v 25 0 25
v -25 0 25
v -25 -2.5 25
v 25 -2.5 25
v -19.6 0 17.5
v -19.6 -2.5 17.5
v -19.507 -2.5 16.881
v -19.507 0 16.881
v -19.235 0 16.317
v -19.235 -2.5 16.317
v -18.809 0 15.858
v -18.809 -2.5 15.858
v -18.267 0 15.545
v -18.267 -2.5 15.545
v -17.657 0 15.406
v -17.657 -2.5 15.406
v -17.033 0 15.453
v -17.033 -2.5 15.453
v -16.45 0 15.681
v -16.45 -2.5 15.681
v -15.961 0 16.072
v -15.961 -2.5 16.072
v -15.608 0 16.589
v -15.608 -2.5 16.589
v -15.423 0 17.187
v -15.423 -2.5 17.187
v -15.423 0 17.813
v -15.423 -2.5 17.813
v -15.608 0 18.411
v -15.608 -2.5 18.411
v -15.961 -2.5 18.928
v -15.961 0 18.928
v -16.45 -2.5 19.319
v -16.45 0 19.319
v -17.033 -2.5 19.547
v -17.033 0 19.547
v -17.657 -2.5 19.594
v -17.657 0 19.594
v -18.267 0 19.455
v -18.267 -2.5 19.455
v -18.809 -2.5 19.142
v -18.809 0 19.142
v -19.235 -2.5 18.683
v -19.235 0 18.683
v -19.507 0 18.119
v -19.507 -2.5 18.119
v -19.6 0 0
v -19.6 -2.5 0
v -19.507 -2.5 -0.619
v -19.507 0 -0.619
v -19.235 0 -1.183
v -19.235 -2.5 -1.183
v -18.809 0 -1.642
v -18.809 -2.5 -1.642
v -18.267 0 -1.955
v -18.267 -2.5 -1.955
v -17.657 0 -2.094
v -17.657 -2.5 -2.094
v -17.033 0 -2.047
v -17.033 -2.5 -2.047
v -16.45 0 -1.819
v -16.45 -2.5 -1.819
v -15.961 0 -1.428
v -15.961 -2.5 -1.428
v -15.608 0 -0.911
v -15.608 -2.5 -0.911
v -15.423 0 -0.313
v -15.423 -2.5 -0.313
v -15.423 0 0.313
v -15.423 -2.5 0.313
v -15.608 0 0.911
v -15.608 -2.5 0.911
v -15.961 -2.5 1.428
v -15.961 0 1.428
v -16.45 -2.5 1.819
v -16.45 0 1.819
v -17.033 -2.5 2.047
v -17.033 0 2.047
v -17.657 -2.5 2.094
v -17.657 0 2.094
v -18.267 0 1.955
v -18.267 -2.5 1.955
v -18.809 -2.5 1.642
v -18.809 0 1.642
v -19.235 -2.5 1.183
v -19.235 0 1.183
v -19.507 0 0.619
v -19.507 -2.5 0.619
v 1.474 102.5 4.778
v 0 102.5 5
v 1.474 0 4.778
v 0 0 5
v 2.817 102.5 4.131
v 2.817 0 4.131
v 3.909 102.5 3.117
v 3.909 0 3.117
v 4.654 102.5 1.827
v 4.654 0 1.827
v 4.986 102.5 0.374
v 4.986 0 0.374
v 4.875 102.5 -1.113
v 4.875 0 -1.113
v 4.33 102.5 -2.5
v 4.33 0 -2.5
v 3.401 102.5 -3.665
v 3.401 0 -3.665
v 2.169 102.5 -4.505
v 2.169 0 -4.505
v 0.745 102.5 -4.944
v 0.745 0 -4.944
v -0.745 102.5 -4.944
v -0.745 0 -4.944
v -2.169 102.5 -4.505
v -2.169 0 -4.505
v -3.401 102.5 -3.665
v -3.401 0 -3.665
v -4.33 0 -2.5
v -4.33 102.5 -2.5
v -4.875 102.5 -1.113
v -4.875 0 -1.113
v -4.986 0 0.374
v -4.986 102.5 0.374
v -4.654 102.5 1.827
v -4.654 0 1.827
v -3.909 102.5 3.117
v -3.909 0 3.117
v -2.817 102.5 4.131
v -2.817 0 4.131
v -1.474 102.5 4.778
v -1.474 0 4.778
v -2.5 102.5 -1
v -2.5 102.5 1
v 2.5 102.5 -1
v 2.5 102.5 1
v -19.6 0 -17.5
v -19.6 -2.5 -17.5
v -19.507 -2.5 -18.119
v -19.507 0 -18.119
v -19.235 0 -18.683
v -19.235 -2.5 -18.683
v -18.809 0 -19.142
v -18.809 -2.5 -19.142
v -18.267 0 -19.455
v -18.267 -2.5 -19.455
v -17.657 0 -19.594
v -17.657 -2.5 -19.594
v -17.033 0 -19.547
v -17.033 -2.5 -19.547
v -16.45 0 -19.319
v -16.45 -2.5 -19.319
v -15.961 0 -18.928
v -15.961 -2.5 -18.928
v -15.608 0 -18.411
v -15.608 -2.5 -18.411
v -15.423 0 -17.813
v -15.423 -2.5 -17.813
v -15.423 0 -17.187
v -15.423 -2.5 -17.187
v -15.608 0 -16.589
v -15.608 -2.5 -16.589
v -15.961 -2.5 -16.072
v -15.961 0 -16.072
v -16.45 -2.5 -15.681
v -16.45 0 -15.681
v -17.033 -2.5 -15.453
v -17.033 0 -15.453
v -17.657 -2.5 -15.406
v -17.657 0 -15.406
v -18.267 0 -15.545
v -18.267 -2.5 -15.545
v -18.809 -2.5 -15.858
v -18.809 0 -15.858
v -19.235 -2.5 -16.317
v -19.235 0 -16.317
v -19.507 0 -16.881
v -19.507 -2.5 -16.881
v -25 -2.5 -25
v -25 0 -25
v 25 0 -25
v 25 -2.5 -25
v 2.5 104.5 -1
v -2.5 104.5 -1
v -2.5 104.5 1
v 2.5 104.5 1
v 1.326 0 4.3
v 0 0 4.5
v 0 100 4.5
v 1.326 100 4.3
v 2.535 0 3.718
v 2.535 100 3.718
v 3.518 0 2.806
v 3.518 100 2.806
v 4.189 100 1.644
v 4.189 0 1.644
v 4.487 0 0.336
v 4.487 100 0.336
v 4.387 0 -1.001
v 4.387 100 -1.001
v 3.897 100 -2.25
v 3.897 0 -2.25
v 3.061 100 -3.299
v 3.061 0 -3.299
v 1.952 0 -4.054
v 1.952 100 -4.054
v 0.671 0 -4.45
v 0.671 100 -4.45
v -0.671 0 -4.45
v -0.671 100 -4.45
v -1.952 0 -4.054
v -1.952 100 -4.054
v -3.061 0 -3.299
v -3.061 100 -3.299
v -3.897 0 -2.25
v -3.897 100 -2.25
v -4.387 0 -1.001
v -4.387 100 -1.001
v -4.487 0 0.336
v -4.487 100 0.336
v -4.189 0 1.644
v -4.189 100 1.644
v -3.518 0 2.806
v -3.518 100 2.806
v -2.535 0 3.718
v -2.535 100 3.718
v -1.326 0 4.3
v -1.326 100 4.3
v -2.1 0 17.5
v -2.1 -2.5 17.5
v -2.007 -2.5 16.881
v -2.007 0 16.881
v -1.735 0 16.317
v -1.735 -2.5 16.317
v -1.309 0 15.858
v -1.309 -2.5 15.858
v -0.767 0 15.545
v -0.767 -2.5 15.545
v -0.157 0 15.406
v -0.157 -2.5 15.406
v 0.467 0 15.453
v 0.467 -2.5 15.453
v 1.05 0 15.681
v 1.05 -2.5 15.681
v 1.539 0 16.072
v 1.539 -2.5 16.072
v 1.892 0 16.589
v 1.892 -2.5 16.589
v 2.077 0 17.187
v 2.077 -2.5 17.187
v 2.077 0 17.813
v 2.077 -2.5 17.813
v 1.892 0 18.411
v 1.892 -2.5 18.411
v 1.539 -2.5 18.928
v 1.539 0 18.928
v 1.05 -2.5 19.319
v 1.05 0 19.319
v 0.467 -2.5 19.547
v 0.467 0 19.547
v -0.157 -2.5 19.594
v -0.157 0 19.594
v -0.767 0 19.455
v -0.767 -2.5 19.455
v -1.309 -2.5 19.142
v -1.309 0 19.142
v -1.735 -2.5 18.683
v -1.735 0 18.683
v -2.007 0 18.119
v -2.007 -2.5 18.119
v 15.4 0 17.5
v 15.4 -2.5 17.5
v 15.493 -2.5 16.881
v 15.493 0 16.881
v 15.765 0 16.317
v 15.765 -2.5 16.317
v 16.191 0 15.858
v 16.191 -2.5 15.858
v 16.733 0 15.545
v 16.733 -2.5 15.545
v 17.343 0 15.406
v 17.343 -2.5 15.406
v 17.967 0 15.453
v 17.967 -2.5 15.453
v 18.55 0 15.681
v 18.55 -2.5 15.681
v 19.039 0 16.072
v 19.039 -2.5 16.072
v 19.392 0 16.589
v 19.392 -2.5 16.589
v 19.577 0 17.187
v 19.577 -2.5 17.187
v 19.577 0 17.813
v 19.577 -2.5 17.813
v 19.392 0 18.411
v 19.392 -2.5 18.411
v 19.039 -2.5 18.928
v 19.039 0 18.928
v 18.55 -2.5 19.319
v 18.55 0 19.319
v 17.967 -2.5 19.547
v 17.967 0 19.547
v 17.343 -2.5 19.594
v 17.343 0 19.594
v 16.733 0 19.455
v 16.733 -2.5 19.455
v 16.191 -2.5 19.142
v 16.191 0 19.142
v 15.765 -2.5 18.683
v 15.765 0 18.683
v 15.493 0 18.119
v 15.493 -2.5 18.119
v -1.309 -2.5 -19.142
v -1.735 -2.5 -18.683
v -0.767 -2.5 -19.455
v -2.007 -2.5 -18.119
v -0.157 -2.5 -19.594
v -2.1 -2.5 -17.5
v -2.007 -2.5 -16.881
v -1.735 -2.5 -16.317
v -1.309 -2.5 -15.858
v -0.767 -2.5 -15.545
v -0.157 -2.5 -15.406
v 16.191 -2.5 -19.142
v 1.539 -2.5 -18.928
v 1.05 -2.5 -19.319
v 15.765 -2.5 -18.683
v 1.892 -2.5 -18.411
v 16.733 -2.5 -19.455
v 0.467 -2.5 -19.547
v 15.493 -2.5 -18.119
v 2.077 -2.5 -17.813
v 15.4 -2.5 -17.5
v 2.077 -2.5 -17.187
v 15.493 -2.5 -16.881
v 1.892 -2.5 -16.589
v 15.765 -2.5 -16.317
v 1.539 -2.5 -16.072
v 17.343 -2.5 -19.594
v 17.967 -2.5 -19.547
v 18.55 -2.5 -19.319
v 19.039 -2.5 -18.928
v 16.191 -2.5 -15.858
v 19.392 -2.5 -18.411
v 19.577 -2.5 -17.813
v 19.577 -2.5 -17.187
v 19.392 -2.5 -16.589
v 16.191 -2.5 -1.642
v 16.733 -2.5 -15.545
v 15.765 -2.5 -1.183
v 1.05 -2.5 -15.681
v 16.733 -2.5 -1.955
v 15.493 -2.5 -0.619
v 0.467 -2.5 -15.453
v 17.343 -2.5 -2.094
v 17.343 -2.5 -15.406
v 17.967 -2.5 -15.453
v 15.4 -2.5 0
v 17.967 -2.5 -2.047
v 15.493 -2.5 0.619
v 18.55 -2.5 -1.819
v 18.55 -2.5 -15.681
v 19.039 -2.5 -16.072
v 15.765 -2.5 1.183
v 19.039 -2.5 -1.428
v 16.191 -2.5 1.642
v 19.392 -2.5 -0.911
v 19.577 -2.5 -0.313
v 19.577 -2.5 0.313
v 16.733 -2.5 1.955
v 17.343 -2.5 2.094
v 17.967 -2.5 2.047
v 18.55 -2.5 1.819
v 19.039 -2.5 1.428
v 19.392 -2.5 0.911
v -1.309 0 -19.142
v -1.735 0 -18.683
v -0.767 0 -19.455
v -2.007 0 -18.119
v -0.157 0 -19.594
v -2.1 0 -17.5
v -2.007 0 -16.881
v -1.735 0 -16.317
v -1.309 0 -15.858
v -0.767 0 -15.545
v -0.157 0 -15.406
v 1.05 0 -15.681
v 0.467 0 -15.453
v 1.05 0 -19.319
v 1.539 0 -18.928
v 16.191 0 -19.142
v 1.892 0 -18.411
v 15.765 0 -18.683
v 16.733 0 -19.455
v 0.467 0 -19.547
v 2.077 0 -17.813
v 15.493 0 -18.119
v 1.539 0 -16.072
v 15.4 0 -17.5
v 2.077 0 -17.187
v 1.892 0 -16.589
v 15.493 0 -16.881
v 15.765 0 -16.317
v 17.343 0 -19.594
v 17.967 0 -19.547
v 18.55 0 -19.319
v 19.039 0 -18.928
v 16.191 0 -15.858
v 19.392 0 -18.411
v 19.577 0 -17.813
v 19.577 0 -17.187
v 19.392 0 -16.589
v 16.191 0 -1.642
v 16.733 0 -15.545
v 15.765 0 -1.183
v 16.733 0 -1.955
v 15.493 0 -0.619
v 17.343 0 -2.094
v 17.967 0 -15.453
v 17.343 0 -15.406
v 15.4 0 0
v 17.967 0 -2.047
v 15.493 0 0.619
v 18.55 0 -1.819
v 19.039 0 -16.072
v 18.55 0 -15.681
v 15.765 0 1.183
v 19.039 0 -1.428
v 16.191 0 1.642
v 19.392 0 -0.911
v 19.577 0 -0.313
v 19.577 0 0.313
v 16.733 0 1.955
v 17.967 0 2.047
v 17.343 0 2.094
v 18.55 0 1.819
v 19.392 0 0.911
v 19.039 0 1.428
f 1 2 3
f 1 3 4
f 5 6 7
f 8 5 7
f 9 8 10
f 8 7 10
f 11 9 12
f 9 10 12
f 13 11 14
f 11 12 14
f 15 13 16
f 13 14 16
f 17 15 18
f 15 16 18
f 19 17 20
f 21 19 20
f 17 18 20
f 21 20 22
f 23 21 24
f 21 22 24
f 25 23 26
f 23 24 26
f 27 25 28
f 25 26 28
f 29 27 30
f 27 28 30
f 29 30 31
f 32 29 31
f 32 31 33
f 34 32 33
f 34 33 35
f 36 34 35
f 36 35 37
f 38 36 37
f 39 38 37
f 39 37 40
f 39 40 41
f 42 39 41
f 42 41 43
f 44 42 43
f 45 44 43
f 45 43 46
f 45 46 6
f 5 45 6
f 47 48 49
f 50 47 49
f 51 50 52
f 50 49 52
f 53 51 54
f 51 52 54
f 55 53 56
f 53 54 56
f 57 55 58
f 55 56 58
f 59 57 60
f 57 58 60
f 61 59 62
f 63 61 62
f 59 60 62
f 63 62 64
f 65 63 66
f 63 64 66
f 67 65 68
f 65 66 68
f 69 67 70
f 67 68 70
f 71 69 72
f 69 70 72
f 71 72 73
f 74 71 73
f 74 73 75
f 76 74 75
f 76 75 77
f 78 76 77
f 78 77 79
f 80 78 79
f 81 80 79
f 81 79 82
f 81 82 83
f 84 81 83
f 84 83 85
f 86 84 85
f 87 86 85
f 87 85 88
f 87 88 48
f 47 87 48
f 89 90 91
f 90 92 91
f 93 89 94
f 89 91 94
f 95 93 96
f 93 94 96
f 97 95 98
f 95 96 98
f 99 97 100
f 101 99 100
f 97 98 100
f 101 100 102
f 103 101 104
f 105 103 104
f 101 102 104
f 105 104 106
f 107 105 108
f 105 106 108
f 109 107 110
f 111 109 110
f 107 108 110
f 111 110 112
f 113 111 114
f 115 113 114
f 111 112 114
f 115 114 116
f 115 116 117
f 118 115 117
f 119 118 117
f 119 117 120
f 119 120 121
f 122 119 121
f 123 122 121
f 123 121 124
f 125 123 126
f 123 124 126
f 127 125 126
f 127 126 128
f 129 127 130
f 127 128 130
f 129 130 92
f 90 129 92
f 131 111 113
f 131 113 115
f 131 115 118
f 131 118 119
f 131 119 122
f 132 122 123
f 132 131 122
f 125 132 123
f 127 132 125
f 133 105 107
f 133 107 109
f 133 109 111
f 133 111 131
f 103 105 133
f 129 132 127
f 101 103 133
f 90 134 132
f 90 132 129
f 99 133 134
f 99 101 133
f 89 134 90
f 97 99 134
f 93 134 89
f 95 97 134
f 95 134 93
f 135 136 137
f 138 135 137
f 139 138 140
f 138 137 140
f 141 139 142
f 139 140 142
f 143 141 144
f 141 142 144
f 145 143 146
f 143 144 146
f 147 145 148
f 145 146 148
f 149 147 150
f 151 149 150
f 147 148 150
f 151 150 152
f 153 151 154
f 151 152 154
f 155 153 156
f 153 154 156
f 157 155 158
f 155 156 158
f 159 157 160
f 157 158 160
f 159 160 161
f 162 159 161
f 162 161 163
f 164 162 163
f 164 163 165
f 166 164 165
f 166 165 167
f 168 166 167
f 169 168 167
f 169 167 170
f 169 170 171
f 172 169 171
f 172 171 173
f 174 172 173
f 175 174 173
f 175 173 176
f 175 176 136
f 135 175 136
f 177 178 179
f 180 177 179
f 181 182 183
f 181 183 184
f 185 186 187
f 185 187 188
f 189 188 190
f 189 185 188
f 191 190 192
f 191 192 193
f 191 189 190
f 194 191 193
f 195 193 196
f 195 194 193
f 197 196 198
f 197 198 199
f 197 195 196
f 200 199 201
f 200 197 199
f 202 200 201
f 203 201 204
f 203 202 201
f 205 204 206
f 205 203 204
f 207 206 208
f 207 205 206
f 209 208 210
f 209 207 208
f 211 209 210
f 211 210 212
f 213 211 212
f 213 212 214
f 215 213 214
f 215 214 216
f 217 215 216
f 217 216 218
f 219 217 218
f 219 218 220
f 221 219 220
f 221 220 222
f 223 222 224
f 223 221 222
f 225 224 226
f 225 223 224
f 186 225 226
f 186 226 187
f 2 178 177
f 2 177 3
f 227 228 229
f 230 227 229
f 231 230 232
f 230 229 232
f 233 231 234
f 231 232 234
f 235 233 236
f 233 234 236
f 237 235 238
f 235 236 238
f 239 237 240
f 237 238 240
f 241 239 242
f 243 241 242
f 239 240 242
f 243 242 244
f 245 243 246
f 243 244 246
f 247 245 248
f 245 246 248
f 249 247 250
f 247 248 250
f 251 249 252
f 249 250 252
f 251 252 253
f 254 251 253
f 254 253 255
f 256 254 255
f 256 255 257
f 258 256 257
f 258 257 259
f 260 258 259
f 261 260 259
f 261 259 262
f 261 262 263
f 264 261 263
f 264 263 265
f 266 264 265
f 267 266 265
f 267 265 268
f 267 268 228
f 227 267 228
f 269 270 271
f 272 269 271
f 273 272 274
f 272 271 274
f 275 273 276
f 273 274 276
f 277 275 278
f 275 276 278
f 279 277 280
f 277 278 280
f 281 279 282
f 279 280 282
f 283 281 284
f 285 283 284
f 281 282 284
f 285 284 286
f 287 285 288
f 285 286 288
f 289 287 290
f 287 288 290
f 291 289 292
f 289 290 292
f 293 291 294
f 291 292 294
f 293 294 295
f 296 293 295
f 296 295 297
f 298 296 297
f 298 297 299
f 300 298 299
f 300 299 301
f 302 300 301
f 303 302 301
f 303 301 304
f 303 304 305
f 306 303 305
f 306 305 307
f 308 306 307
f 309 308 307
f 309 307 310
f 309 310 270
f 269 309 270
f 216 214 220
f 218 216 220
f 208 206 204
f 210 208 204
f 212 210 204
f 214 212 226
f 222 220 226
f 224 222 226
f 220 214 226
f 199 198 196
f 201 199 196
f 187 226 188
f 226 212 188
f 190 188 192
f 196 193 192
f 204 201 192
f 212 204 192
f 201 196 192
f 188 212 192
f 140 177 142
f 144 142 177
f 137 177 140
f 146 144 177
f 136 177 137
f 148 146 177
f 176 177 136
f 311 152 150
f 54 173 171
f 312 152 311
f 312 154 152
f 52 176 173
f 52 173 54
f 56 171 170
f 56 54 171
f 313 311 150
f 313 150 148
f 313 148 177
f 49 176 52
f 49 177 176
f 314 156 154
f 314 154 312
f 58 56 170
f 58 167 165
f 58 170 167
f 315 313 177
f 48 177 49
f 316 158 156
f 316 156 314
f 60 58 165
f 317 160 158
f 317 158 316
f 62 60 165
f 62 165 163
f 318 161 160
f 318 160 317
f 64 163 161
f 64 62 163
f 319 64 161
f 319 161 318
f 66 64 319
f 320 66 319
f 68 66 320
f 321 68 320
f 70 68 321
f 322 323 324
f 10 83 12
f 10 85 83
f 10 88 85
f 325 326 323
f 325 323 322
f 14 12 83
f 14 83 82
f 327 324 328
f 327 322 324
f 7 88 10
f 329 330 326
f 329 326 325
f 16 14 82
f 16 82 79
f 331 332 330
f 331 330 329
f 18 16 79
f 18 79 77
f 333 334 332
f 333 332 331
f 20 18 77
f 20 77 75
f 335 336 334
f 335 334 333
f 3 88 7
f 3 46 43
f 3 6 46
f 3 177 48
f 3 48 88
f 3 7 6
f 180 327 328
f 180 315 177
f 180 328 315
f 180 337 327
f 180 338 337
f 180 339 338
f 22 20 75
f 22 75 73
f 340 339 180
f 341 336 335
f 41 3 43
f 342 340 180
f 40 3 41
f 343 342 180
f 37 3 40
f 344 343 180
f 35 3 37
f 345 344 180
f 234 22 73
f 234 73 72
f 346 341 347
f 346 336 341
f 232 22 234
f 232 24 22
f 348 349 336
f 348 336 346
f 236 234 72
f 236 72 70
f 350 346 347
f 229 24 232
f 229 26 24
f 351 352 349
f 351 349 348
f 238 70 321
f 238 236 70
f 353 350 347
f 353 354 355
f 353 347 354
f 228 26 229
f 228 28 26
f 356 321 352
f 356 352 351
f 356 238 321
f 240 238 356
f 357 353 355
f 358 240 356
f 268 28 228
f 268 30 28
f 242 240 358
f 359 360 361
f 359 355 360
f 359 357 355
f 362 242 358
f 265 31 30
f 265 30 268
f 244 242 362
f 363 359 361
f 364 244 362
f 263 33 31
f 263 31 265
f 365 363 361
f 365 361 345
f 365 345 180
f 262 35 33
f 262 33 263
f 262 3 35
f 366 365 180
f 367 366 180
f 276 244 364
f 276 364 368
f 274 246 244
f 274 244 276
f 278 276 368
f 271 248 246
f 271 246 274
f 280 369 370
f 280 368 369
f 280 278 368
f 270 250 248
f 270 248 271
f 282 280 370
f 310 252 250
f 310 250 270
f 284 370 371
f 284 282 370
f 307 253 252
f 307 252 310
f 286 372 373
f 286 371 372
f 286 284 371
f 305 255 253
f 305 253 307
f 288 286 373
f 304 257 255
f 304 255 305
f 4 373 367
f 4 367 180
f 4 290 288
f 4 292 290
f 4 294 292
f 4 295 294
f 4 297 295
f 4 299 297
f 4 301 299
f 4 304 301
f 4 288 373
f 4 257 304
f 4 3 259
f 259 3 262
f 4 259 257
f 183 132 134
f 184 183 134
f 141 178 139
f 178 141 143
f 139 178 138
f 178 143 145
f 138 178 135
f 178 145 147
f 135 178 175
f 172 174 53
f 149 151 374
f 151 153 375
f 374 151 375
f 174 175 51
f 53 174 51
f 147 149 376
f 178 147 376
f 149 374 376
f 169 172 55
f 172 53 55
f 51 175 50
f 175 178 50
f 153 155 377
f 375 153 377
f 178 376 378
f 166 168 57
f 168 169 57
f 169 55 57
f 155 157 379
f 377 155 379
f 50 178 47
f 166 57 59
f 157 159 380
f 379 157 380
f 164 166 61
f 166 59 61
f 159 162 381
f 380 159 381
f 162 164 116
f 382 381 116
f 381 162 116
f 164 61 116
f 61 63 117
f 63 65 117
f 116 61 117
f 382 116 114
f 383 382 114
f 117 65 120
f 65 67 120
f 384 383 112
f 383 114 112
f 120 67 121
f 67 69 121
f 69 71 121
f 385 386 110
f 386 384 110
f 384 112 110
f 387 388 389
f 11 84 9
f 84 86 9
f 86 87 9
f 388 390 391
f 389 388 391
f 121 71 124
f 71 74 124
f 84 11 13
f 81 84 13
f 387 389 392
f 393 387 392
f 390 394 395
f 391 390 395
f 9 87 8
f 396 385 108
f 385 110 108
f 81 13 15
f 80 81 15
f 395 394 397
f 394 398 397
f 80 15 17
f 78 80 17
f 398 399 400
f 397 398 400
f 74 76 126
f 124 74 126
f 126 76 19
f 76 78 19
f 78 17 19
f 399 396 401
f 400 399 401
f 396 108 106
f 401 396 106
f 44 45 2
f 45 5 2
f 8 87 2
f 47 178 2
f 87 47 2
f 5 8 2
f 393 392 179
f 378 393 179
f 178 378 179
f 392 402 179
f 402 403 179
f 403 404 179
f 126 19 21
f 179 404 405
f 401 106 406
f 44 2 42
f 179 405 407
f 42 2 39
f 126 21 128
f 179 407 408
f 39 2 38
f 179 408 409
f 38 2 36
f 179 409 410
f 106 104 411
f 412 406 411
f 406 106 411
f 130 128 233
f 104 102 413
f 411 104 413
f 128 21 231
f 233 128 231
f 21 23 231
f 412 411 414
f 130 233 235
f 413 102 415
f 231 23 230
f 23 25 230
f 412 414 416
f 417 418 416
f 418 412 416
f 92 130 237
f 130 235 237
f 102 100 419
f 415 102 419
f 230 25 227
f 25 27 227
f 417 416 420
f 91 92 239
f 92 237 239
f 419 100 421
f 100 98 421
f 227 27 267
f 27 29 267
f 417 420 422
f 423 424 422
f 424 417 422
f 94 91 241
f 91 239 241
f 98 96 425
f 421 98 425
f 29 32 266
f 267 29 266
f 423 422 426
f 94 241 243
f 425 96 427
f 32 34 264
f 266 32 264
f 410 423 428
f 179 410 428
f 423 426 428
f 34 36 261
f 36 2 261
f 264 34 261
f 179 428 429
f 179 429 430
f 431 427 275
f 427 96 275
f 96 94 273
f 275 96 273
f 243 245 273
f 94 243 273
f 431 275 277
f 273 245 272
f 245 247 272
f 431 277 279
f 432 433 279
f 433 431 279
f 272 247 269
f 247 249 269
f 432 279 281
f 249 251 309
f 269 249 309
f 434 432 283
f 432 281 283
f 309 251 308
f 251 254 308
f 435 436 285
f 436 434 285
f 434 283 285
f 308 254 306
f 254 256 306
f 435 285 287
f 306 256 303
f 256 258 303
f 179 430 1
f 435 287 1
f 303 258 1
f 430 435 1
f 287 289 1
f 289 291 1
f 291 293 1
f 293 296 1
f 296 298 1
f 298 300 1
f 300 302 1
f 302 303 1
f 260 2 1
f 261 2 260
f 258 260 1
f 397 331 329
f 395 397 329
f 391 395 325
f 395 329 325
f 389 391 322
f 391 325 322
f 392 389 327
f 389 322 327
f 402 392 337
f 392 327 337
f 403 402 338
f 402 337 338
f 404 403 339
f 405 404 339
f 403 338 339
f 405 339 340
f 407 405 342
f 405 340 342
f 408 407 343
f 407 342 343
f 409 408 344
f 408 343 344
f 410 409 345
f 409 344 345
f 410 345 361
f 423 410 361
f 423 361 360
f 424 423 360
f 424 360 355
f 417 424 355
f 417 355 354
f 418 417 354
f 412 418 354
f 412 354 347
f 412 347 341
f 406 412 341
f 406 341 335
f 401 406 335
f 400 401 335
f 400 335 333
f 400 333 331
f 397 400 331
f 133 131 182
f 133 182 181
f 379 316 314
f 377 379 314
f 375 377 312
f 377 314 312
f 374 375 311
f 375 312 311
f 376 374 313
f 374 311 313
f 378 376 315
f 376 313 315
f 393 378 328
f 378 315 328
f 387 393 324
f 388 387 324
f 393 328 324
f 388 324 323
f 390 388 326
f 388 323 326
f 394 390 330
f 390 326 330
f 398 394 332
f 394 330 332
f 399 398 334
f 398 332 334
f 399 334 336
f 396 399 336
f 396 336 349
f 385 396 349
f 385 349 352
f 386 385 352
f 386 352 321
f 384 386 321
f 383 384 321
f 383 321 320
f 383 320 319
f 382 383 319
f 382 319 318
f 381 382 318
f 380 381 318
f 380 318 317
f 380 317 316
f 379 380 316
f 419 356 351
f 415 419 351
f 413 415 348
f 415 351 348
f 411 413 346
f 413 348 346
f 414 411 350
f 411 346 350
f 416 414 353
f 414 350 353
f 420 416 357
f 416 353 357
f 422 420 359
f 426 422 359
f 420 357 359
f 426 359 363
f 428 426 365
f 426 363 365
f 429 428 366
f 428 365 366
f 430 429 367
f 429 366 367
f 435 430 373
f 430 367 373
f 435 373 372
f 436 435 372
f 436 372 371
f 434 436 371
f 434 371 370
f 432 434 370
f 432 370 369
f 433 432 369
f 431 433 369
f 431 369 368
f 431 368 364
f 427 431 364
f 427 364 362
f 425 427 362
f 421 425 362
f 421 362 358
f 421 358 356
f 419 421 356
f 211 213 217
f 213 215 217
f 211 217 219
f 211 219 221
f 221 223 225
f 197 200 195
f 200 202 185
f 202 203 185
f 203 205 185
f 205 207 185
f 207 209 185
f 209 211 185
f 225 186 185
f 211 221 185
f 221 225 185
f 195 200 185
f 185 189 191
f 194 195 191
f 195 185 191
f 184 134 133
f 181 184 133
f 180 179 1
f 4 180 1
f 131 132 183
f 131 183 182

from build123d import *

# Parameters (mm, degrees)
SKETCH1_R                 = 5
SKETCH1_R_2               = 4.5
BOSS_EXTRUDE1_DEPTH       = 100
SKETCH2_R                 = 5
BOSS_EXTRUDE2_DEPTH       = 2.5
SKETCH3_W                 = 50
SKETCH3_H                 = 50
BOSS_EXTRUDE3_DEPTH       = 2.5
M5X0_8_TAPPED_HOLE1_D     = 4.2
M5X0_8_TAPPED_HOLE1_DEPTH = 14
M5X0_8_TAPPED_HOLE1_TIP   = 1.2618073
SKETCH6_W                 = 5
SKETCH6_H                 = 2
BOSS_EXTRUDE5_DEPTH       = 2


with BuildPart() as part:
    # Sketch1 → Boss-Extrude1 (new body)
    with BuildSketch(Plane(origin=(0, 0, 0), x_dir=(1, 0, 0), z_dir=(0, 1, 0))):
        with Locations(Location((0, 0, 0), (0, 0, 270))):
            Circle(SKETCH1_R)
        with Locations(Location((0, 0, 0), (0, 0, 270))):
            Circle(SKETCH1_R_2, mode=Mode.SUBTRACT)
    extrude(amount=BOSS_EXTRUDE1_DEPTH)

    # Sketch2 → Boss-Extrude2 (add)
    with BuildSketch(Plane(origin=(0, 100, 0), x_dir=(1, 0, 0), z_dir=(0, 1, 0))):
        with Locations(Location((0, 0, 0), (0, 0, 270))):
            Circle(SKETCH2_R)
    extrude(amount=BOSS_EXTRUDE2_DEPTH)

    # Sketch3 → Boss-Extrude3 (add)
    with BuildSketch(Plane.XZ):
        Rectangle(SKETCH3_W, SKETCH3_H)
    extrude(amount=BOSS_EXTRUDE3_DEPTH)

    # M5x0.8 Tapped Hole1
    with Locations(Plane(origin=(0, 0, 0), x_dir=(1, 0, 0), z_dir=(0, 1, 0))):
        with Locations((-17.5, 0), (-17.5, -17.5), (0, -17.5), (17.5, -17.5), (17.5, 0), (17.5, 17.5), (0, 17.5), (-17.5, 17.5)):
            Hole(M5X0_8_TAPPED_HOLE1_D / 2, depth=M5X0_8_TAPPED_HOLE1_DEPTH)
            with Locations((0, 0, -(M5X0_8_TAPPED_HOLE1_DEPTH + M5X0_8_TAPPED_HOLE1_TIP / 2))):  # 118° drill point
                Cone(0, M5X0_8_TAPPED_HOLE1_D / 2, M5X0_8_TAPPED_HOLE1_TIP, mode=Mode.SUBTRACT)

    # Sketch6 → Boss-Extrude5 (add)
    with BuildSketch(Plane(origin=(0, 102.5, 0), x_dir=(1, 0, 0), z_dir=(0, 1, 0))):
        Rectangle(SKETCH6_W, SKETCH6_H)
    extrude(amount=BOSS_EXTRUDE5_DEPTH)


solid = part.part
